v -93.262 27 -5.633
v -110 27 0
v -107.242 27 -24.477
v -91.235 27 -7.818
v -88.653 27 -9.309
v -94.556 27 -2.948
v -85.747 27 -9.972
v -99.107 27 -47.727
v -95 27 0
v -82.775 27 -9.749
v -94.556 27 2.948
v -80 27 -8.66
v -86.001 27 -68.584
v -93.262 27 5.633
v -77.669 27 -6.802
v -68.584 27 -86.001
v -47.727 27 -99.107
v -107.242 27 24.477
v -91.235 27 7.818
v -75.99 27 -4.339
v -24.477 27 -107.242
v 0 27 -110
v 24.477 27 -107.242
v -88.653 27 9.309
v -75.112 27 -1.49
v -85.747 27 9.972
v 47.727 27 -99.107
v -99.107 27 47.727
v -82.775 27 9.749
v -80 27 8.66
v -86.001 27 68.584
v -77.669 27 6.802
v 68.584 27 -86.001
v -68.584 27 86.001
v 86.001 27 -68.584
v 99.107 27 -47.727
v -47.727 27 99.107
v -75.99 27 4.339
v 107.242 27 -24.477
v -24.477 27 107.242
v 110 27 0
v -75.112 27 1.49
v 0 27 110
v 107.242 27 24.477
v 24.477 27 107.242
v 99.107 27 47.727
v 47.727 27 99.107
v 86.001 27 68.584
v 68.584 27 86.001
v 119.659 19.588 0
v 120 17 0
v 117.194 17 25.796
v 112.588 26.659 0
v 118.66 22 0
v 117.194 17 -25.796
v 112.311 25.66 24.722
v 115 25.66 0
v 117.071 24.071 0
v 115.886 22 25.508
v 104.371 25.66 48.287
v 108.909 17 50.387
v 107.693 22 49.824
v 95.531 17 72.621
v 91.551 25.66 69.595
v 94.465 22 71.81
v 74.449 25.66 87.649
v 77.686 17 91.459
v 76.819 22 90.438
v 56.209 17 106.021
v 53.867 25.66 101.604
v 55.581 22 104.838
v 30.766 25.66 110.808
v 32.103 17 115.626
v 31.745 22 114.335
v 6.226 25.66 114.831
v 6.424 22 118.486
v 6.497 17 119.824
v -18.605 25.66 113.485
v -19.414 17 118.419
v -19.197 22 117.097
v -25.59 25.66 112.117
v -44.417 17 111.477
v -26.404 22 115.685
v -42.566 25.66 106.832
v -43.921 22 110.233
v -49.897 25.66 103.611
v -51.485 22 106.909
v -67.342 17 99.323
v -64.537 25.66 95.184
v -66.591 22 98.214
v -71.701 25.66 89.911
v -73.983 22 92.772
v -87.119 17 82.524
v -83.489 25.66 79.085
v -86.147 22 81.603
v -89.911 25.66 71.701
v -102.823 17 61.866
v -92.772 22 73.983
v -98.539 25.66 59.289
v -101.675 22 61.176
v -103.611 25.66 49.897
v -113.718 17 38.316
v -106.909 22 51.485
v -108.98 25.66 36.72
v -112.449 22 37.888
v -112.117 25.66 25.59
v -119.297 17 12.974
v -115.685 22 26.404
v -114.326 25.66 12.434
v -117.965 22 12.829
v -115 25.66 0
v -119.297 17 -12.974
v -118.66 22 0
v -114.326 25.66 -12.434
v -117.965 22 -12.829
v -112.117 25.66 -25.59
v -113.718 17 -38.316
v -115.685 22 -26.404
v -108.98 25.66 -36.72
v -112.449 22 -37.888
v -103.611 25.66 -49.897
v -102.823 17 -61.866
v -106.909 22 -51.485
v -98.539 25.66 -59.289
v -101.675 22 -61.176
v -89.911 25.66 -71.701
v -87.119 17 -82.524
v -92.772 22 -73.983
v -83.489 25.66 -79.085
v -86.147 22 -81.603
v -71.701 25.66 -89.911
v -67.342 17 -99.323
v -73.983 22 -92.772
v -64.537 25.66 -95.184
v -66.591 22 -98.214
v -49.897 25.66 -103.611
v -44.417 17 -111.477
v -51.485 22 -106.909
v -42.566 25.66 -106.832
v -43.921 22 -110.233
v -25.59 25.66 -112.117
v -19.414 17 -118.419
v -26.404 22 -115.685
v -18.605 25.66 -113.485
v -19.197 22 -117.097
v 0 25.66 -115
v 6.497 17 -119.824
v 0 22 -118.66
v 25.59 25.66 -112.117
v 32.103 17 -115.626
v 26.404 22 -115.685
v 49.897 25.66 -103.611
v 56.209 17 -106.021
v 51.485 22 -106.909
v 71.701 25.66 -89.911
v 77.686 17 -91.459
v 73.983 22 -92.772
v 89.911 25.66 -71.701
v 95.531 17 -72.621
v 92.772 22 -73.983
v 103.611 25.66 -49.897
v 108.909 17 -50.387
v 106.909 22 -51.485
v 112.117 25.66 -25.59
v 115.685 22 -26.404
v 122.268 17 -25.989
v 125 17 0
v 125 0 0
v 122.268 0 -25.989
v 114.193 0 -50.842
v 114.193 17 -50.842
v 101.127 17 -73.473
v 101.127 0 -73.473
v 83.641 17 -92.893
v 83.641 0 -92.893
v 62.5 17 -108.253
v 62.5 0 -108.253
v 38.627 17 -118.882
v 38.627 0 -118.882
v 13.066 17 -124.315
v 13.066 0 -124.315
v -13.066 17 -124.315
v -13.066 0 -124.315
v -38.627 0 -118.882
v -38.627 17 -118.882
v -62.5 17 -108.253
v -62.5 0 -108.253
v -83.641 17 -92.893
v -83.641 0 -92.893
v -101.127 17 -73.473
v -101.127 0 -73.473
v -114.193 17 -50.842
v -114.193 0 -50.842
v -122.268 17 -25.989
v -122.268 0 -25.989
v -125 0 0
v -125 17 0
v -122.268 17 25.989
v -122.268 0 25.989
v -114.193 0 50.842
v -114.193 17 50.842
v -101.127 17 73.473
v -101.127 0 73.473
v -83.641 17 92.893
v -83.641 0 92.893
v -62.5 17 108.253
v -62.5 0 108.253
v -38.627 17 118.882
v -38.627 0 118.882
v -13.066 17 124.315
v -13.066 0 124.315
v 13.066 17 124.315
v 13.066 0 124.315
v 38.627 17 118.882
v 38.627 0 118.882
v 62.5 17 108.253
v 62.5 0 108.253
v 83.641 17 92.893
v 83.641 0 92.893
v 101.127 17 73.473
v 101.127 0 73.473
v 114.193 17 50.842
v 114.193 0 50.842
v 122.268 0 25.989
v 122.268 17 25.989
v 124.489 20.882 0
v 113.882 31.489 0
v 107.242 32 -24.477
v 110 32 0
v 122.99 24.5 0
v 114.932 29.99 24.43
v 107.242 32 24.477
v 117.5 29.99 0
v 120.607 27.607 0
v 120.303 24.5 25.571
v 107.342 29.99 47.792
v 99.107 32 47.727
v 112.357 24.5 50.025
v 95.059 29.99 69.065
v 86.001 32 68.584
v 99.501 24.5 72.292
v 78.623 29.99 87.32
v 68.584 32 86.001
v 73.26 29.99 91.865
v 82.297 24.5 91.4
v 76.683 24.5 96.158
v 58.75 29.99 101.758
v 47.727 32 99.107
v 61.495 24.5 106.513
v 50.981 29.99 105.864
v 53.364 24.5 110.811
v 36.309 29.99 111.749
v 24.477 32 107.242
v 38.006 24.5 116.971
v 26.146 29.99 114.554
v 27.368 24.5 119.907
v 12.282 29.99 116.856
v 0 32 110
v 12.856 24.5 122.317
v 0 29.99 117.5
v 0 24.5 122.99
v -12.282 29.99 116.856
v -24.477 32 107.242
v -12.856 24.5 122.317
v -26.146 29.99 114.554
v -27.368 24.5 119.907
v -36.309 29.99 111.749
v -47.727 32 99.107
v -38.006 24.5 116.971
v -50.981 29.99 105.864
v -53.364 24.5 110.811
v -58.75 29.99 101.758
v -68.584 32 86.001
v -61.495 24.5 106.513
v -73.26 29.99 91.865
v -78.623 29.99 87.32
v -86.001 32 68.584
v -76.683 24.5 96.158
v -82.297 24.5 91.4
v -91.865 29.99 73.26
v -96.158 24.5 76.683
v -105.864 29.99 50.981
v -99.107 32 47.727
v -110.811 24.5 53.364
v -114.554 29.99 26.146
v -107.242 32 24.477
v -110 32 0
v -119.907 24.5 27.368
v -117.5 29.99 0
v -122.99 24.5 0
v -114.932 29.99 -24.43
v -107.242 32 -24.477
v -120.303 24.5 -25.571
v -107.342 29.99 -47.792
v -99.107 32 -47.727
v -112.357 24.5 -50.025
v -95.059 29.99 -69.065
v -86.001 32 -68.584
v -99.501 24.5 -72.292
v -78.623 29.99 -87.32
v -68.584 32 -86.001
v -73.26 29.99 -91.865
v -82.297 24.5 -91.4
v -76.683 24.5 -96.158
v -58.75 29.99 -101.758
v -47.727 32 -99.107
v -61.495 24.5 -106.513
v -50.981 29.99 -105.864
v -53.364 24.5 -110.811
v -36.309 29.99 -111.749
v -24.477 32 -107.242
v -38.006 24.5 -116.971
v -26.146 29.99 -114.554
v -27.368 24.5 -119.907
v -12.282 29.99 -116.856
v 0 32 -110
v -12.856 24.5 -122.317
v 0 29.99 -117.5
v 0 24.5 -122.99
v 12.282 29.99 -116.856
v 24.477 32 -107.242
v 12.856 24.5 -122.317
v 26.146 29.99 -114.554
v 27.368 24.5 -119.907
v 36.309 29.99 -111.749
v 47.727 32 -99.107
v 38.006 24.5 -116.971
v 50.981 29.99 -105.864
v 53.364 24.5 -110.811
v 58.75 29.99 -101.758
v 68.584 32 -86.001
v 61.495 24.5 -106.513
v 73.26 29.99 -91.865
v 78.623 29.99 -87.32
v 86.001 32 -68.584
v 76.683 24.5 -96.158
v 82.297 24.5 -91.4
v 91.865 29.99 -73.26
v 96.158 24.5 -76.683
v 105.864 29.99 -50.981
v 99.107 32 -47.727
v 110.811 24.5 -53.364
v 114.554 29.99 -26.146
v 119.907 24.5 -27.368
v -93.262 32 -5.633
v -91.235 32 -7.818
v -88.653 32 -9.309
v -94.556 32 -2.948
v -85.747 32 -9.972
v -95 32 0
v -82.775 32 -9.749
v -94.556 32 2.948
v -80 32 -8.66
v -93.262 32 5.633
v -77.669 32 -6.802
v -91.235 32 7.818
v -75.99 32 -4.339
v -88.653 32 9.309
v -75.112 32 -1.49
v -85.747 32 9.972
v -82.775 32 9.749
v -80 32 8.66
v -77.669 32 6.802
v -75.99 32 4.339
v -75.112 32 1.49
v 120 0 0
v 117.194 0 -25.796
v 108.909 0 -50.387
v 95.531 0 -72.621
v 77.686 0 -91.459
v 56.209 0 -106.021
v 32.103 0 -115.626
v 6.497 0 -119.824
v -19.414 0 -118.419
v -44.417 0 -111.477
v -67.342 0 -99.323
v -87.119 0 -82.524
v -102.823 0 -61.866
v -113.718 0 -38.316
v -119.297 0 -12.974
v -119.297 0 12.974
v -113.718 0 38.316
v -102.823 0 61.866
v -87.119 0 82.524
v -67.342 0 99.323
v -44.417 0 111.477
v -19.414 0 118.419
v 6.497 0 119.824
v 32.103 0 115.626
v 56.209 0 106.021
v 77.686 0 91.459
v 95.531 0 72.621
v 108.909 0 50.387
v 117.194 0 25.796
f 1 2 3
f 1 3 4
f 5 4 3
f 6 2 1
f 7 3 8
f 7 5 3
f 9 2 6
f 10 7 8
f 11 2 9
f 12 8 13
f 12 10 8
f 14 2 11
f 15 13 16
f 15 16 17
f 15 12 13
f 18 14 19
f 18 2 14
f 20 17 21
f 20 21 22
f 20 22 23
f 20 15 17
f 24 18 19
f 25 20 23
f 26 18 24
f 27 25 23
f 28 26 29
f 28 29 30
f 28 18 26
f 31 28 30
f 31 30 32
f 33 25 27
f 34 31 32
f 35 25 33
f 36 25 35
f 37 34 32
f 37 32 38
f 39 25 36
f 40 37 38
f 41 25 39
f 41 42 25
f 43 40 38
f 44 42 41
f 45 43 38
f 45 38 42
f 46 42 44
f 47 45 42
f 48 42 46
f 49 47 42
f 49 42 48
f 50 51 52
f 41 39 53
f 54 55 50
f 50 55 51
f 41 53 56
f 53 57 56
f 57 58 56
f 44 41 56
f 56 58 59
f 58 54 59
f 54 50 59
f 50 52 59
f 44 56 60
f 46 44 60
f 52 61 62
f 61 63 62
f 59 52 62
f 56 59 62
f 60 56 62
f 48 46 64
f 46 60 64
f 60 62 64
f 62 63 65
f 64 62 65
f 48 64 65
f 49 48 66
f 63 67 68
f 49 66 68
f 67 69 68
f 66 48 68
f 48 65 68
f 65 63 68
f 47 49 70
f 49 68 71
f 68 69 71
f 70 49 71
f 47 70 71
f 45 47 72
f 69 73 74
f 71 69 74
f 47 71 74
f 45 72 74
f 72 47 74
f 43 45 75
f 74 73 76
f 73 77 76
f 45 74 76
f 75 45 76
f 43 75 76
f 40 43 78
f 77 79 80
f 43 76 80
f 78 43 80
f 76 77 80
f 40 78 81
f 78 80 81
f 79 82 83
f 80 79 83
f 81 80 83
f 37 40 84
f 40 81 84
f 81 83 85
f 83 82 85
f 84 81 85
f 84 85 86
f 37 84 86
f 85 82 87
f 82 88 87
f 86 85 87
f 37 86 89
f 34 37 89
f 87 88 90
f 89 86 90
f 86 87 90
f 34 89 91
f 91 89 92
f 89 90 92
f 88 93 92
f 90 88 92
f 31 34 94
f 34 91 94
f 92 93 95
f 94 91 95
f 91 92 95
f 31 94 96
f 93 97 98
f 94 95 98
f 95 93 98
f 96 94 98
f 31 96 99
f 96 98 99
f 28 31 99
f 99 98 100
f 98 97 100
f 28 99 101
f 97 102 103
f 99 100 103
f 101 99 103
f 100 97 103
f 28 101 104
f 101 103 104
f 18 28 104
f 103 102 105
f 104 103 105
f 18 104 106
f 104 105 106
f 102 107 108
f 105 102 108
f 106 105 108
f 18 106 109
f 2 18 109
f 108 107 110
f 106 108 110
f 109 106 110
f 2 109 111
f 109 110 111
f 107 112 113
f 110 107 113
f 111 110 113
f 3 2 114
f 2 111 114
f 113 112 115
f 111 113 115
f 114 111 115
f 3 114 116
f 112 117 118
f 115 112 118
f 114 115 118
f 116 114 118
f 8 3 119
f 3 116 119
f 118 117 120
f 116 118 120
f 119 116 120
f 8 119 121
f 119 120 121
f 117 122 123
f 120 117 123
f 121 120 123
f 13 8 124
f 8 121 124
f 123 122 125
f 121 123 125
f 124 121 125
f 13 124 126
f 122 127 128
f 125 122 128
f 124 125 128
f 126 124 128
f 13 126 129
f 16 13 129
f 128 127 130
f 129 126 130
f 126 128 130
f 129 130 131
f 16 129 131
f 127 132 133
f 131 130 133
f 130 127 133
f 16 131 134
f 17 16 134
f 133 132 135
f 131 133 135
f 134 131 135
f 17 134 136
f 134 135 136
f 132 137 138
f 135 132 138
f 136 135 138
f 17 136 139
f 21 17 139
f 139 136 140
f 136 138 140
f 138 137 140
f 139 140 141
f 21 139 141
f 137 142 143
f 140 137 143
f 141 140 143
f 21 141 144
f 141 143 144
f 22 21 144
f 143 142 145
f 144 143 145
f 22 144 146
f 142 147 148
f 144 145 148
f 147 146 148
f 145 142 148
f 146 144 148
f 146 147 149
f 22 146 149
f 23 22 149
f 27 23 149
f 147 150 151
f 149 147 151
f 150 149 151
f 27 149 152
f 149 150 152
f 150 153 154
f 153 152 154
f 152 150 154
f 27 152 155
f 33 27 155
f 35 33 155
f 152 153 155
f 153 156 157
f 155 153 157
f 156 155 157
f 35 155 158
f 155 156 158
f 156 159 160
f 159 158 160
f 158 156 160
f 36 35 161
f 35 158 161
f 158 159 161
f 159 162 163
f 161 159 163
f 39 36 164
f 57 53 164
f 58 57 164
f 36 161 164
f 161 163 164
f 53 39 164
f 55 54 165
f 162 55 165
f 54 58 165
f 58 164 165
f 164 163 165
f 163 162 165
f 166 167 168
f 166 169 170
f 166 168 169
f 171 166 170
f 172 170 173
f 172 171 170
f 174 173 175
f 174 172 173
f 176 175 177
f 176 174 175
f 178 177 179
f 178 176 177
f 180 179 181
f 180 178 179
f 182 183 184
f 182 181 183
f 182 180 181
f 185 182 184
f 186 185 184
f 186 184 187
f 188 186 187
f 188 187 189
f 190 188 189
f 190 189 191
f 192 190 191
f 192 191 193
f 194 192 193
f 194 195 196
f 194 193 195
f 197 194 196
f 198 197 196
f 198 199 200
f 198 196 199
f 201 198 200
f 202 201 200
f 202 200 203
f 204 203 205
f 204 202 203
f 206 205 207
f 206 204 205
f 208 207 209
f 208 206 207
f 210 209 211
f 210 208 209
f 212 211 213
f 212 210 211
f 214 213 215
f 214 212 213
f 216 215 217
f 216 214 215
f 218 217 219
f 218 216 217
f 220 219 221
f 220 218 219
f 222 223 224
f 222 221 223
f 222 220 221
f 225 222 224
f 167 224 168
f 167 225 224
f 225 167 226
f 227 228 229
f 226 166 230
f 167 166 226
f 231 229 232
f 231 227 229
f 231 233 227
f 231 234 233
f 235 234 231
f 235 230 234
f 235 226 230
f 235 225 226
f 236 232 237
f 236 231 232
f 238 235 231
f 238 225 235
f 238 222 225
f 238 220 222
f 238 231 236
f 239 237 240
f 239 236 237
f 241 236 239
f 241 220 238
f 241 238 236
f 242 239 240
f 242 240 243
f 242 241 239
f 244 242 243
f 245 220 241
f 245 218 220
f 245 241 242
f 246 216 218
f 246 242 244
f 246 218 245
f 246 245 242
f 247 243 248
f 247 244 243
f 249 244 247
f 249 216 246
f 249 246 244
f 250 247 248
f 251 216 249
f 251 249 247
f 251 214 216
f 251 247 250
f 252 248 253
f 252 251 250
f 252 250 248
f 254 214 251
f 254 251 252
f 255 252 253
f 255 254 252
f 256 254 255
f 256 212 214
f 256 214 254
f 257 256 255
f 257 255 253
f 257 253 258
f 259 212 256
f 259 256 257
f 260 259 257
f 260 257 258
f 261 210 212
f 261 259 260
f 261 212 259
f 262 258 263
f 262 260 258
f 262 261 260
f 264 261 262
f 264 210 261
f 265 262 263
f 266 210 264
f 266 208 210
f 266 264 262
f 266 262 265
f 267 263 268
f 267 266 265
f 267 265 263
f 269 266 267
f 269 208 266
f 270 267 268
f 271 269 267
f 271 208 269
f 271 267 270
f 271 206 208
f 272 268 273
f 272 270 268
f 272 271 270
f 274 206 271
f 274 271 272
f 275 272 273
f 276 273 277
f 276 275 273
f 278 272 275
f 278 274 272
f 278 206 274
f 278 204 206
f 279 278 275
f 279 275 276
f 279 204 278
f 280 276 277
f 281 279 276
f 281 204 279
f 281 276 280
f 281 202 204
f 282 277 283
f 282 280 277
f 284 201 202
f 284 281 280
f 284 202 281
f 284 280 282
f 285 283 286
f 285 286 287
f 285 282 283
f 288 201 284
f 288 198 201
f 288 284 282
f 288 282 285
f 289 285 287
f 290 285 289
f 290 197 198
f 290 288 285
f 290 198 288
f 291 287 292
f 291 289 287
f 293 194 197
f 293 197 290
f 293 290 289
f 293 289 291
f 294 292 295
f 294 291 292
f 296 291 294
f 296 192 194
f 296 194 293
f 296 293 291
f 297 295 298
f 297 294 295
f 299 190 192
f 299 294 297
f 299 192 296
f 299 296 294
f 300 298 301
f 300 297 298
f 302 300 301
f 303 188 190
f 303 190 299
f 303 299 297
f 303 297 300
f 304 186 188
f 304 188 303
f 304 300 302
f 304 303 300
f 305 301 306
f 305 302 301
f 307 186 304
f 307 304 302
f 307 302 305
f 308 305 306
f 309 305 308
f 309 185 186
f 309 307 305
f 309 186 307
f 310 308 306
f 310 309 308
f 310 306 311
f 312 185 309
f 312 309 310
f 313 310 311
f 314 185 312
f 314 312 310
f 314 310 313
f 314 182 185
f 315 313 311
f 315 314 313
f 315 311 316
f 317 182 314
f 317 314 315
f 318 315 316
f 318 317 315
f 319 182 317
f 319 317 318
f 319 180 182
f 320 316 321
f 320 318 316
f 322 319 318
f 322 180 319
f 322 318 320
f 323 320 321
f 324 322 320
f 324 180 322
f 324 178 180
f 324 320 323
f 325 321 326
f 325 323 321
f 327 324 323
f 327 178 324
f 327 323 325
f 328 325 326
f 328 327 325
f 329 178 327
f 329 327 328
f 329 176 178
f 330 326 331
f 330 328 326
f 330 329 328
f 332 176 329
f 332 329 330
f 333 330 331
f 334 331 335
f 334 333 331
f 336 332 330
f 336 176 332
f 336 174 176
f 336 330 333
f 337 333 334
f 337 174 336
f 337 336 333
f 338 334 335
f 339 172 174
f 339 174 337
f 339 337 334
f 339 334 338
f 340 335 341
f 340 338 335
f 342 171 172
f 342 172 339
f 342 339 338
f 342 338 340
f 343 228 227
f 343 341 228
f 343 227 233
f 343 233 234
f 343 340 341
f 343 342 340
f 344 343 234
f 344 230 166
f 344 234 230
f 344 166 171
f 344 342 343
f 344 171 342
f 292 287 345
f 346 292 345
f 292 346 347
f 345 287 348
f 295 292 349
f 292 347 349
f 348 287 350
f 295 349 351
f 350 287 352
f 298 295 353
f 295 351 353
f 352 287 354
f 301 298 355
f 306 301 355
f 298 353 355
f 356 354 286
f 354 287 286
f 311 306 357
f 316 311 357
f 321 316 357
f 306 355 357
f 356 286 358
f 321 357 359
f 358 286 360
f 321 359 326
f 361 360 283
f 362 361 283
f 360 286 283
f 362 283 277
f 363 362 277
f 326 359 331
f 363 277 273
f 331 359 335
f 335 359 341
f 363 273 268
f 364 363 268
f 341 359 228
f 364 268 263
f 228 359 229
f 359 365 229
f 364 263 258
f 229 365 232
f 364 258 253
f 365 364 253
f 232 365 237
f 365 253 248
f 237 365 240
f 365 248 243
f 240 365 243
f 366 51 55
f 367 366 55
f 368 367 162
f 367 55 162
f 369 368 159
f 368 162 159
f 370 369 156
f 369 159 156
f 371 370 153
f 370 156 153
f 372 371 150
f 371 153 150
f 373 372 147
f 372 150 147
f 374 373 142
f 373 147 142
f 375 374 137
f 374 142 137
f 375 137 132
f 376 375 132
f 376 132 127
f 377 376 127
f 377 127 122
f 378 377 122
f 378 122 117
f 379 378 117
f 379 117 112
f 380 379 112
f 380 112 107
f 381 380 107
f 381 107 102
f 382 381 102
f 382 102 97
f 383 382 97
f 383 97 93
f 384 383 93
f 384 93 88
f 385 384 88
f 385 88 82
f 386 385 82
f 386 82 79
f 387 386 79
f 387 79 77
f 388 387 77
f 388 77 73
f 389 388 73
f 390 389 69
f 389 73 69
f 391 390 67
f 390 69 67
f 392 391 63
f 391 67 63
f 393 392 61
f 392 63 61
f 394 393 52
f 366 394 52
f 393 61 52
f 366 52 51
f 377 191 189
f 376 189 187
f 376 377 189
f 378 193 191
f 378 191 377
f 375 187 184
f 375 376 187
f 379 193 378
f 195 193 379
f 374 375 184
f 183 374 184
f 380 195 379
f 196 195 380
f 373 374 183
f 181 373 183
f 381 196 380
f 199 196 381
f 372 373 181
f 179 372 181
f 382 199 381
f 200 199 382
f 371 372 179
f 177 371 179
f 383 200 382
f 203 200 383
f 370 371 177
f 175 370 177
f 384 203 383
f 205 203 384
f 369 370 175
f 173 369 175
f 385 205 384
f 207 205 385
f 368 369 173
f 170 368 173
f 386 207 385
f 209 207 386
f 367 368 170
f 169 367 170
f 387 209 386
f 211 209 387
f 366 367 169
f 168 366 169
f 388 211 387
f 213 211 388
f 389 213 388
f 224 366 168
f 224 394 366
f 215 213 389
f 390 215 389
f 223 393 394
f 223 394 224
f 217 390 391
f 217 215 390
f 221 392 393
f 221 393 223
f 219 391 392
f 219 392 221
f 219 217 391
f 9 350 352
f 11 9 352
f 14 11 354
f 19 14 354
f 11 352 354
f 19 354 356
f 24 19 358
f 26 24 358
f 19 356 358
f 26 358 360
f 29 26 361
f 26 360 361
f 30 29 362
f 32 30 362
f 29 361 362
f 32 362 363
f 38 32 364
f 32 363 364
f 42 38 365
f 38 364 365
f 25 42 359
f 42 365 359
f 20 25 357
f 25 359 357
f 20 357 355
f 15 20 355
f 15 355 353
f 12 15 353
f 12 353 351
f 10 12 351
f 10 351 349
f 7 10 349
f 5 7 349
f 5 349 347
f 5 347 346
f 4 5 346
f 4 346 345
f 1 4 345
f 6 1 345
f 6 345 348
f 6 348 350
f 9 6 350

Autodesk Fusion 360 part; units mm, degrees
sketch "LampBase" plane through (0, 0, 0) normal (0, 0, 1) x (1, 0, 0)
  line L0 (0, 0) -> (125, 0)
  line L1 (125, 0) -> (125, 32)
  line L2 (125, 32) -> (0, 32)
  line L3 (0, 32) -> (0, 0)
  dimension "d1" = 125
  dimension "d2" = 32
revolve "Revolve1" add sketch "LampBase" angle 360 about axis through (0, 32, 0) along (0, -1, 0)
fillet "Fillet1" radius 15 1 edges at (-116.5409, 32, -45.2019)
shell "Shell1" thickness 5 removed faces 1 at (-15.2225, 0, 33.3824)
sketch "Sketch2" plane through (0, 32, 0) normal (0, 1, 0) x (-1, 0, 0)
  circle A0 centre (0, 0) radius 110
  circle A1 centre (85, 0) radius 10
  dimension "d6" = 20
  dimension "d7" = 85
extrude "Extrude1" cut sketch "Sketch2" against normal blind 10 contours A1
